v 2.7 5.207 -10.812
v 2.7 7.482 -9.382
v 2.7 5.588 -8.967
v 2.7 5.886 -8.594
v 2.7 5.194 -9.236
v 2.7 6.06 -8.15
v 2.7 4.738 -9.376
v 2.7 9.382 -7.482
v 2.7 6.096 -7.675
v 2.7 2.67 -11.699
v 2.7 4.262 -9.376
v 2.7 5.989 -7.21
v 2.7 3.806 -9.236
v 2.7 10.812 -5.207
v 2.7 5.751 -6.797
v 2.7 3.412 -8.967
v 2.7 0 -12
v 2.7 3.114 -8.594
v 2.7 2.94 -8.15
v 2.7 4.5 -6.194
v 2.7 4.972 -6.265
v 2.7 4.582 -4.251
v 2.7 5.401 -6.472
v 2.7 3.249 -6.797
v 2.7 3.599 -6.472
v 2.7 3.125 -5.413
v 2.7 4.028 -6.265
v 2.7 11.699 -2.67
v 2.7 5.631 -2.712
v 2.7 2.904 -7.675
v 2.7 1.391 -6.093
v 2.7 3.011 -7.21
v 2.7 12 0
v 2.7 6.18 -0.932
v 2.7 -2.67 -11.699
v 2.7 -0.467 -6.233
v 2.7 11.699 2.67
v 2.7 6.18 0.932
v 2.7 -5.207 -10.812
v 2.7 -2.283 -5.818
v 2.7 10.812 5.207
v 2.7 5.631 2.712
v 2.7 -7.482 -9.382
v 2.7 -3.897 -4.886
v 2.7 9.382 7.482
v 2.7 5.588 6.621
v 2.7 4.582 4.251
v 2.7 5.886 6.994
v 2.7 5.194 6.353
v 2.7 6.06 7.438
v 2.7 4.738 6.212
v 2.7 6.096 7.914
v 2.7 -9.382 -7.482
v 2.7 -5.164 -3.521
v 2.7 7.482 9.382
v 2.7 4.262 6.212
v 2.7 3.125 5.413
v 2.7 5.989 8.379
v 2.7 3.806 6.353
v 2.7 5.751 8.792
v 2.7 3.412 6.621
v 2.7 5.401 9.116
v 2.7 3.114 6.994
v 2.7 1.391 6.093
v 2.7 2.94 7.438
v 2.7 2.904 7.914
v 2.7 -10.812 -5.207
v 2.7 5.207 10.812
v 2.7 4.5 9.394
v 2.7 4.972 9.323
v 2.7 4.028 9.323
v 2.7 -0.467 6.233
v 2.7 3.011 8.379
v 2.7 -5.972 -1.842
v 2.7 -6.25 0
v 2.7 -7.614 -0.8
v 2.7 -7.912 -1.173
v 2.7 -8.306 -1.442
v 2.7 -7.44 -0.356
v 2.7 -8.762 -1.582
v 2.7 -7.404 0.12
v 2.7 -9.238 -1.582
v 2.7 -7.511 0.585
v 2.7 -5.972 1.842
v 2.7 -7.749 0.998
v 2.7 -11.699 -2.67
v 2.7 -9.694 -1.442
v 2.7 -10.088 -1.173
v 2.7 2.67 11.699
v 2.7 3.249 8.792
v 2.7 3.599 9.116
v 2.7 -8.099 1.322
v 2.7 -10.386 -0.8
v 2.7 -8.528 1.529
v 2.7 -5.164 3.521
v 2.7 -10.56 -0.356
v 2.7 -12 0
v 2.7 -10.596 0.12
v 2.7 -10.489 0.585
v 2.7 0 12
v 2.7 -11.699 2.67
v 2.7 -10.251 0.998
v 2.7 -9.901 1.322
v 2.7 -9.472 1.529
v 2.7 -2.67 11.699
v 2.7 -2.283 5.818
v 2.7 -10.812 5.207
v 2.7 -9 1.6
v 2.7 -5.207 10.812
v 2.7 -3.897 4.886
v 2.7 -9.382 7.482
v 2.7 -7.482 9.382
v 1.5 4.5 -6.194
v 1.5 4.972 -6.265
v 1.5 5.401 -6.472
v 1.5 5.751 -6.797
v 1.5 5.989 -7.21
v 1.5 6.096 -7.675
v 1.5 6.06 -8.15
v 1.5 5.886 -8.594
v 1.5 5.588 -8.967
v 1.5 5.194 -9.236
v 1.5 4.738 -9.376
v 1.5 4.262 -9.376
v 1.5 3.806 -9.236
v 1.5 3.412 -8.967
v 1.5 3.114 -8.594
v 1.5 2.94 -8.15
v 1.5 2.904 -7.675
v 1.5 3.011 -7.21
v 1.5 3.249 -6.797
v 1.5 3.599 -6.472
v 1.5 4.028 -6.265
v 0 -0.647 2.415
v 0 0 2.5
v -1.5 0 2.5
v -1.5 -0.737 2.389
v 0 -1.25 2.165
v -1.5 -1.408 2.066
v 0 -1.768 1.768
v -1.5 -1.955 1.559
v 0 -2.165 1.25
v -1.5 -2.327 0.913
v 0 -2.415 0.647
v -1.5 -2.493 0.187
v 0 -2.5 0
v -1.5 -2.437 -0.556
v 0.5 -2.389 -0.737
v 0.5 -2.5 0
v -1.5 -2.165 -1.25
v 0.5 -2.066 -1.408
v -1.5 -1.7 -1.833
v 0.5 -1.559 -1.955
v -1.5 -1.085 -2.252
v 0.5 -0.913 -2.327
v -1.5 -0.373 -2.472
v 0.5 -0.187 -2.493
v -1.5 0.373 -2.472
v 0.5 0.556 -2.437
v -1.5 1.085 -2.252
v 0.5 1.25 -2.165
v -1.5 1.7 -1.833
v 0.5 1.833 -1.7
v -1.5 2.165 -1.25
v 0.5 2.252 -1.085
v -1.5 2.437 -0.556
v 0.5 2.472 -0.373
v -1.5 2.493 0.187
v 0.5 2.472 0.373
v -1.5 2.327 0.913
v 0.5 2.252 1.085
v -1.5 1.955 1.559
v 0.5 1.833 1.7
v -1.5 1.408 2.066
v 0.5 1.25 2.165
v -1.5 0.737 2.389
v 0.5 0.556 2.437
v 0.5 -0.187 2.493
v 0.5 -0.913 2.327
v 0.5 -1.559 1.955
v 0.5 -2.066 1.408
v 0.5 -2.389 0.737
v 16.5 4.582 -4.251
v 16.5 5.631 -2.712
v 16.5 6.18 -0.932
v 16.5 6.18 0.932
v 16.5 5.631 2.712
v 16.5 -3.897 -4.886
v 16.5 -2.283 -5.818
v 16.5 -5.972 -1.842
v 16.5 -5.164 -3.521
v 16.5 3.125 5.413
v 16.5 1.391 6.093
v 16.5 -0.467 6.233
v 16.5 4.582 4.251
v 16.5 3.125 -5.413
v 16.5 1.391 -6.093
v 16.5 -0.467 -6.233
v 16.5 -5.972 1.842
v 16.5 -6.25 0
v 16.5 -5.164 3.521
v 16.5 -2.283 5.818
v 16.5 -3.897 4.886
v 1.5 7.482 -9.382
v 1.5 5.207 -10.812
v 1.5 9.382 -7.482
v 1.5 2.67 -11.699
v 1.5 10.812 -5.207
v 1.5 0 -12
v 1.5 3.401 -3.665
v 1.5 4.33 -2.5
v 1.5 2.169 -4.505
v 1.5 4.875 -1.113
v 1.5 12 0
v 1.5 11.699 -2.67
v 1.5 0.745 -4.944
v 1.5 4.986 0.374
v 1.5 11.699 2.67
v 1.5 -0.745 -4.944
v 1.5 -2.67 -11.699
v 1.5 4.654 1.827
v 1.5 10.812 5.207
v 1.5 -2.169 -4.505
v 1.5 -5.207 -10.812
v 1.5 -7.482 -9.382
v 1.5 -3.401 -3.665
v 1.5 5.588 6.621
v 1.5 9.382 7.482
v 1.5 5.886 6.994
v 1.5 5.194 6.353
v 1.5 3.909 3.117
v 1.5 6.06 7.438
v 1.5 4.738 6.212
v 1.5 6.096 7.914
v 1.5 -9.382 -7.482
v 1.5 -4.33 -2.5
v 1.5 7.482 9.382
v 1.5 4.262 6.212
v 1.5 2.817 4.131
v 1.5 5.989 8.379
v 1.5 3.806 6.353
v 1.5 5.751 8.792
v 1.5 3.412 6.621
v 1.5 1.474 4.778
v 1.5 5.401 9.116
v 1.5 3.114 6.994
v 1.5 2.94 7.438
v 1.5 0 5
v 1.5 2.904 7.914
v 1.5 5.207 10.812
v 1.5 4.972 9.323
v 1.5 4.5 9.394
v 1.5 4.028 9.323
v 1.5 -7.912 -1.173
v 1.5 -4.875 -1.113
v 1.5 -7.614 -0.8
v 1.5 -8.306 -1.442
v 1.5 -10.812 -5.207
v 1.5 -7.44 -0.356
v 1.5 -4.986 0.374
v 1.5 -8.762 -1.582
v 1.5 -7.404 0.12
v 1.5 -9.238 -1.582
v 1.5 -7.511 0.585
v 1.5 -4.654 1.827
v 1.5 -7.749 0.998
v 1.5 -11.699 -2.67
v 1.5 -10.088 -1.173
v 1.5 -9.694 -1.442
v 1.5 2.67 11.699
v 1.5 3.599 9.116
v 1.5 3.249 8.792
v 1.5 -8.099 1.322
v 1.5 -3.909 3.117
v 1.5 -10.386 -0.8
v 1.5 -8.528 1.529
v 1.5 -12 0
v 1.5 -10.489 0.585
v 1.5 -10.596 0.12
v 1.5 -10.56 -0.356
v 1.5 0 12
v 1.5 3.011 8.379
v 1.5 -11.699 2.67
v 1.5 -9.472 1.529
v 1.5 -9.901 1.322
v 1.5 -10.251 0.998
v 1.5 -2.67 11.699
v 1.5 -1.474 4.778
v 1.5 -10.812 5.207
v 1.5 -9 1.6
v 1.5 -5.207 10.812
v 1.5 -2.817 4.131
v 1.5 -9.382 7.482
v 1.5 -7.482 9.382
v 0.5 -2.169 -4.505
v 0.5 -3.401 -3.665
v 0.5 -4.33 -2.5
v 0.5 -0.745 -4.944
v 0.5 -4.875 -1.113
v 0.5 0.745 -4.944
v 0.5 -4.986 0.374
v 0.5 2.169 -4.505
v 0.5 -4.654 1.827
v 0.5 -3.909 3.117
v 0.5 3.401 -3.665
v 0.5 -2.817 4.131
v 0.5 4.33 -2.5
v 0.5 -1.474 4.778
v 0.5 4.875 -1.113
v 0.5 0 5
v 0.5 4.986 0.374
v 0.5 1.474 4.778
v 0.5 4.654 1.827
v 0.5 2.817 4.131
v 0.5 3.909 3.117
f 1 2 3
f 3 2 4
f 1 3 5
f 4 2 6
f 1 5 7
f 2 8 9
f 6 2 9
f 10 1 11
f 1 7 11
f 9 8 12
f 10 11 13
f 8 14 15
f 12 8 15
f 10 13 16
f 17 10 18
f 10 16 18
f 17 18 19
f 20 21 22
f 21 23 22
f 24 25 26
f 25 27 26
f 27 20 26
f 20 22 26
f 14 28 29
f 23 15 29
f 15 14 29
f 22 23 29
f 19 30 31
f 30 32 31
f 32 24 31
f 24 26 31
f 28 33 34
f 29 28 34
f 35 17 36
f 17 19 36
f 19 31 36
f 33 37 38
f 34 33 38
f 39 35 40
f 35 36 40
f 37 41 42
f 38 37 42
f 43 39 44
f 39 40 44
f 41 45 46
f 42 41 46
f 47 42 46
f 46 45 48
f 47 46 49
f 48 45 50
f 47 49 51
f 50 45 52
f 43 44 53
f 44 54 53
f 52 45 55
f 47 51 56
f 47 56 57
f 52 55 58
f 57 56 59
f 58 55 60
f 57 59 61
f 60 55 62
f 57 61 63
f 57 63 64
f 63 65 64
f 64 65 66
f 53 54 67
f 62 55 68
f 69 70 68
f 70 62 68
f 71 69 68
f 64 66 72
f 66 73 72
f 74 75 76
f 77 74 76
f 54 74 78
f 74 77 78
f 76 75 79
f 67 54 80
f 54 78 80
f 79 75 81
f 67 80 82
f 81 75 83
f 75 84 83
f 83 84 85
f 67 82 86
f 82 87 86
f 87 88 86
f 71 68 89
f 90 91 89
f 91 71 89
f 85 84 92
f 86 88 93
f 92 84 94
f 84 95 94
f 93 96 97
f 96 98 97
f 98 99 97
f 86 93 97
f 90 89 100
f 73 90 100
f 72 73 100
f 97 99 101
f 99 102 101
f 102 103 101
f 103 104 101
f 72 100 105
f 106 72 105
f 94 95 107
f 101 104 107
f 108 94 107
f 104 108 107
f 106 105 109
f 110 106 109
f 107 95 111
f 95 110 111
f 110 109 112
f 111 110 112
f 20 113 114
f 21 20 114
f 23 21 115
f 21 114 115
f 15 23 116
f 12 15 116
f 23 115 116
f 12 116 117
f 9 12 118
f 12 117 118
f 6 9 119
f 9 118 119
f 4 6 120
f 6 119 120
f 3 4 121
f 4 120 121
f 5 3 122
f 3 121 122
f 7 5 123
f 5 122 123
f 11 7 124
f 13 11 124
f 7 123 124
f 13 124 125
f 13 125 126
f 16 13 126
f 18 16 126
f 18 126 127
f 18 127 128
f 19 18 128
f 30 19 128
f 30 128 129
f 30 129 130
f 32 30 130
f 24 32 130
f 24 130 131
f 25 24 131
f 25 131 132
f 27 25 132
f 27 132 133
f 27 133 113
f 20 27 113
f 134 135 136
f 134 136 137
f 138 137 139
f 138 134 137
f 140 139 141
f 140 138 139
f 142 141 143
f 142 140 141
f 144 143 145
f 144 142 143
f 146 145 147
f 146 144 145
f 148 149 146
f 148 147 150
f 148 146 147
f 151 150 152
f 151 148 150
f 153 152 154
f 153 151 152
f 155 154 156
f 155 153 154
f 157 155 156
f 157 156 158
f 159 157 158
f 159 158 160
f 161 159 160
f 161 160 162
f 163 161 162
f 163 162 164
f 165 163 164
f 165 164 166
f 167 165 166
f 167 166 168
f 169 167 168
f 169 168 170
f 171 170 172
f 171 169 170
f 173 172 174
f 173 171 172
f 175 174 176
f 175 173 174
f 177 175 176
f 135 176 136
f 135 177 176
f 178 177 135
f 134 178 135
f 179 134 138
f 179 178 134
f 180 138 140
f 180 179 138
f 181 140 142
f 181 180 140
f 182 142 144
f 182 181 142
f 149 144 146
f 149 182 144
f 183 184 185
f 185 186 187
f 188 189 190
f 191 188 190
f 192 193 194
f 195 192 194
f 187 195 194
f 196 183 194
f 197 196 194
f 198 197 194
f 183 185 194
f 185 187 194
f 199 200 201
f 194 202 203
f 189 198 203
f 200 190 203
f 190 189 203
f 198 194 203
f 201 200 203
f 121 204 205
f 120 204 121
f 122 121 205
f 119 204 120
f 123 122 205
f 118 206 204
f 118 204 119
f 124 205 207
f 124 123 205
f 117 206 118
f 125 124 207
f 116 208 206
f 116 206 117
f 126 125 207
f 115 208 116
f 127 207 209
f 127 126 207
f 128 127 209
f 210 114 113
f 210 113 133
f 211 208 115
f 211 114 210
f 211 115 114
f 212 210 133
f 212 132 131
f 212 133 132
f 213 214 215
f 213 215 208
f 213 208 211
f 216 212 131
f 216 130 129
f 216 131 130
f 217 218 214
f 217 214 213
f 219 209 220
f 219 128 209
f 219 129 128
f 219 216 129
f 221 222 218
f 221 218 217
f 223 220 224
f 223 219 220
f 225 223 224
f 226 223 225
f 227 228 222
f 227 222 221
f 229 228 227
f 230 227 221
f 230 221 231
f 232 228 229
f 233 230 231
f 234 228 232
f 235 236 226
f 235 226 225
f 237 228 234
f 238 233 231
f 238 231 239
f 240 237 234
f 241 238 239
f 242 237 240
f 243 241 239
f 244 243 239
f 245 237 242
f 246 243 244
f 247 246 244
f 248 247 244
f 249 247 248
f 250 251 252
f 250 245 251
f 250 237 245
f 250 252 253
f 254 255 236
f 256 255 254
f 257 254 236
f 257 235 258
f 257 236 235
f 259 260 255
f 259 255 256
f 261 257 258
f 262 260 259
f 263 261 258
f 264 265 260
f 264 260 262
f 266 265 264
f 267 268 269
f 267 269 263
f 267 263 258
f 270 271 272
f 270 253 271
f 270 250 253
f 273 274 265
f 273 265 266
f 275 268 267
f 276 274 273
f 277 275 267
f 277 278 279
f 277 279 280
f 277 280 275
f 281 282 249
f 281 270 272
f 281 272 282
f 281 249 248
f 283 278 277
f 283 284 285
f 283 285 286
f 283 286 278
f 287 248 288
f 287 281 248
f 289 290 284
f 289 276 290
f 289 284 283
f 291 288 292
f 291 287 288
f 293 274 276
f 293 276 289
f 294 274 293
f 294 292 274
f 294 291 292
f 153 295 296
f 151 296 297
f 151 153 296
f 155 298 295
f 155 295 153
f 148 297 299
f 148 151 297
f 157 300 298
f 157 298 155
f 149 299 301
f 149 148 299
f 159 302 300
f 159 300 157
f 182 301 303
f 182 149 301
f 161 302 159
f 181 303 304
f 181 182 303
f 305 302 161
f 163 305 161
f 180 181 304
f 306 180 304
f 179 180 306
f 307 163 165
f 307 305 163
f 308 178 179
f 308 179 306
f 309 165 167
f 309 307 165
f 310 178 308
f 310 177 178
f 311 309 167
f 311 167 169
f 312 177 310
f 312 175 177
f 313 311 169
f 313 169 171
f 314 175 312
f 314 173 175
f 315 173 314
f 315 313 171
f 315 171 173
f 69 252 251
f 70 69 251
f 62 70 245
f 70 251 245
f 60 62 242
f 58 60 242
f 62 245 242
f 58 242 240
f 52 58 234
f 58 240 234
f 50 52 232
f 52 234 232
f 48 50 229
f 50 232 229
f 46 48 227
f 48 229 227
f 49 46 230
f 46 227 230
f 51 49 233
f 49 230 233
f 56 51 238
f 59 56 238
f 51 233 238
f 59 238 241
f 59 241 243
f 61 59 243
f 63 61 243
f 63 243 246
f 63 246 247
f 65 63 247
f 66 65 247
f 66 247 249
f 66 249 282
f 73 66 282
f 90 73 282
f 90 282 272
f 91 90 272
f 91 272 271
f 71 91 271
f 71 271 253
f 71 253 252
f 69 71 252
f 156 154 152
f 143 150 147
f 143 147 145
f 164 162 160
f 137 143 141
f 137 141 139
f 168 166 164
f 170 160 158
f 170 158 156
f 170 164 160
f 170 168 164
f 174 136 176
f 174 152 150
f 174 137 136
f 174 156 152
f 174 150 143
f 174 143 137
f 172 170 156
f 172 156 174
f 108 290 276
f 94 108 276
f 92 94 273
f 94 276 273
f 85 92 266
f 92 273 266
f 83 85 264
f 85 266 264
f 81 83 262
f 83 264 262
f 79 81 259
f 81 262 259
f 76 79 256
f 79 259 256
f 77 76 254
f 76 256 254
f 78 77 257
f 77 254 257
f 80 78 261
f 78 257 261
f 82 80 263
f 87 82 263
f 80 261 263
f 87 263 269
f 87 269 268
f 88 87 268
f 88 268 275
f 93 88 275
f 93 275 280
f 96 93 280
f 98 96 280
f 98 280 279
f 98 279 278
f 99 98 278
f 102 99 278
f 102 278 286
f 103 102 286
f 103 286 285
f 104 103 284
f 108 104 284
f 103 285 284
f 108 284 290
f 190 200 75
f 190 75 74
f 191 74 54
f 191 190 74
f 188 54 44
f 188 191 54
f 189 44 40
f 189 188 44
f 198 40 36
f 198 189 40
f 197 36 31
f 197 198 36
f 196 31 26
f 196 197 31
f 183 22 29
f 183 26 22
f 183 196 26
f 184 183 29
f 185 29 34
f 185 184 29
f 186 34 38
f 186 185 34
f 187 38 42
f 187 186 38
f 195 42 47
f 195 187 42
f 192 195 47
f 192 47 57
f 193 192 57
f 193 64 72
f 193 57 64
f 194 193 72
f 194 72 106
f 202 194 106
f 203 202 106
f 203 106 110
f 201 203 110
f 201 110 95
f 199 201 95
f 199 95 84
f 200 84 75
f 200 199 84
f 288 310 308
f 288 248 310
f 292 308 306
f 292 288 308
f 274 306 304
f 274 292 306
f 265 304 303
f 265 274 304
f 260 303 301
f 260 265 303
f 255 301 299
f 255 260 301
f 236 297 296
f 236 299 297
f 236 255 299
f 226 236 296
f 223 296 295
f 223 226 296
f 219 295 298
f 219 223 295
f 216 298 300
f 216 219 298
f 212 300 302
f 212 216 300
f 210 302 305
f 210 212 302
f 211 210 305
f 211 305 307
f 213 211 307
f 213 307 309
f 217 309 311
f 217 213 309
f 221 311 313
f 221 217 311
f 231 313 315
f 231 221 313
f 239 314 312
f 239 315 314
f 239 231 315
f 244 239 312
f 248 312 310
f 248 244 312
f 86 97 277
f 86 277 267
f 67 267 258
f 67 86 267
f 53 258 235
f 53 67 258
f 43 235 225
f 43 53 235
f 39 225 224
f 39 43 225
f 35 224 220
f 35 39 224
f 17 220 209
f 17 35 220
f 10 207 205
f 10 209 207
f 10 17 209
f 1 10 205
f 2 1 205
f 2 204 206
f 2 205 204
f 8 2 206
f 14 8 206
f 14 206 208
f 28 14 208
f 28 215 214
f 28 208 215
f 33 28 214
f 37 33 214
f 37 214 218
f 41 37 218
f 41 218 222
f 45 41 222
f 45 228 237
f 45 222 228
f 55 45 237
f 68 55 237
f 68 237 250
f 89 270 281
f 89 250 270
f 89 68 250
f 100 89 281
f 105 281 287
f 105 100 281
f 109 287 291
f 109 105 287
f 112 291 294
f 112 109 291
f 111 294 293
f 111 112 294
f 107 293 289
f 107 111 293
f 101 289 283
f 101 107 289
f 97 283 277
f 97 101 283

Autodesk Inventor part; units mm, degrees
ref_plane "YZ Plane" through (0, 0, 0) normal (1, 0, 0) x (0, 1, 0)
ref_plane "XZ Plane" through (0, 0, 0) normal (0, 1, 0) x (-1, 0, 0)
ref_plane "XY Plane" through (0, 0, 0) normal (0, 0, 1) x (1, 0, 0)
sketch "Sketch1" plane through (0, 0, 0) normal (0, 0, 1) x (1, 0, 0)
  line L0 (2.7, -6.25) -> (16.5, -6.25)
  line L1 (16.5, -6.25) -> (16.5, 0)
  line L2 (16.5, 0) -> (0, 0)
  line L3 (0, 0) -> (0, -2.5)
  line L4 (0, -2.5) -> (1.5, -2.5)
  line L5 (1.5, -2.5) -> (1.5, -12)
  line L6 (1.5, -12) -> (2.7, -12)
  line L7 (2.7, -12) -> (2.7, -6.25)
  dimension "d0" = 6.25
  dimension "d1" = 15
  dimension "d2" = 1.2
  dimension "d3" = 12
  dimension "d4" = 2.5
  dimension "d5" = 1.5
revolve "Revolution1" add sketch "Sketch1" angle 360 about axis through (16.5, 0, 0) along (-1, 0, 0)
sketch "Sketch2" plane through (1.5, 0, 0) normal (-1, 0, 0) x (0, 0, 1)
  circle A0 centre (0, 0) radius 9 construction
  circle A1 centre (0, -9) radius 1.6
  line L0 (0, -16.8) -> (0, 16.8) projected
  circle A2 centre (7.7942, 4.5) radius 1.6
  circle A3 centre (-7.7942, 4.5) radius 1.6
  dimension "d7" = 18
  dimension "d8" = 3.2
  dimension "d11" = 360
extrude "Extrusion1" cut sketch "Sketch2" against normal blind 1.2
sketch "Sketch3" plane through (0, 0, 0) normal (-1, 0, 0) x (0, 0, 1)
  circle A0 centre (0, 0) radius 2.5 projected
  point P0 (0, 0)
extrude "Extrusion2" add sketch "Sketch3" along normal blind 1.5
sketch "Sketch4" plane through (1.5, 0, 0) normal (-1, 0, 0) x (0, 0, 1)
  circle A0 centre (0, 0) radius 5
  dimension "d17" = 10
extrude "Extrusion3" add sketch "Sketch4" along normal blind 1
properties part number "SRM-12-06A"
